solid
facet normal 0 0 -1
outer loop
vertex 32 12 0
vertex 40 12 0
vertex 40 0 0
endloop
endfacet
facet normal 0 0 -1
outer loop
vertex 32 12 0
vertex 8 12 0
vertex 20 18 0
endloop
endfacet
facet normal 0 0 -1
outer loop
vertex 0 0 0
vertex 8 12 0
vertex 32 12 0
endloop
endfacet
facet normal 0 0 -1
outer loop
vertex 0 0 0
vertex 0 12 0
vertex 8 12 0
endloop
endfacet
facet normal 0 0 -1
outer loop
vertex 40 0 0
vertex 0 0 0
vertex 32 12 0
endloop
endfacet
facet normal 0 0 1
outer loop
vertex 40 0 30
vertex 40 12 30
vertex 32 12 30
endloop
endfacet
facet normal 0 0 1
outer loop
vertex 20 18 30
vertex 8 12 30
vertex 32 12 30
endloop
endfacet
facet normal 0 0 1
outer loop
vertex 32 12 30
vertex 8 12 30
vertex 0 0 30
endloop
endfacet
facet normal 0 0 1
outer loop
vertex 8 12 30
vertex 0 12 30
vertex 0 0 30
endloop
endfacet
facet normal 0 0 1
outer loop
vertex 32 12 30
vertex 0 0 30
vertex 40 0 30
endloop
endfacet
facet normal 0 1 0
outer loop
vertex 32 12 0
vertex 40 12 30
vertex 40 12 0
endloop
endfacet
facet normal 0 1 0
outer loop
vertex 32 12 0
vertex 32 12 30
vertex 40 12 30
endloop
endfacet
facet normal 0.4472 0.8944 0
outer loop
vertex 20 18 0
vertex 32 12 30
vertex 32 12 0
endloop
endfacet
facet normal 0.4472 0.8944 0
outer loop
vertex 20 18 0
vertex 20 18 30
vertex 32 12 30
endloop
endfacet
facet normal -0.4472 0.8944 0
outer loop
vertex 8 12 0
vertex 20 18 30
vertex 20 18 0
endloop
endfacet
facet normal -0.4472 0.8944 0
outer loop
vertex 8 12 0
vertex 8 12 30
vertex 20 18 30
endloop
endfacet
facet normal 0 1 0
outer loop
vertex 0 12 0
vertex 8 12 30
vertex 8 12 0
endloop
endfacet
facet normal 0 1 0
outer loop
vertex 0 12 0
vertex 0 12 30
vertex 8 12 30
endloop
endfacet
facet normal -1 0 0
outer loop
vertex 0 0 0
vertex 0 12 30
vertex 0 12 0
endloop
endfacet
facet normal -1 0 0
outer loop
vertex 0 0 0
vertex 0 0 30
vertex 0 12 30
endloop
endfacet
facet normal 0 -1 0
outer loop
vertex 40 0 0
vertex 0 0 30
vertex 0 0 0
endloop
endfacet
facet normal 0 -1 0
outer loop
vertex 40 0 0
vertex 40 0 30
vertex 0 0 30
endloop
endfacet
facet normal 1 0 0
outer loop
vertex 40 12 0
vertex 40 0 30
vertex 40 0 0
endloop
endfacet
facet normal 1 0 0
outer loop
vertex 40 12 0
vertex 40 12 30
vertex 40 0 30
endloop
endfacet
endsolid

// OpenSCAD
$fn = 32;

// ----------------------------------------------------------------------
// V guide rail: vrib, 40 mm wide
// ----------------------------------------------------------------------

// --- parameters (mm) ---
rail_w = 40;              // rail width, X
base_t = 12;              // base plate thickness
v_depth = 6;              // V feature depth / height
v_half_w = 12;            // half width of the V at the base face
plate_t = 30;             // rail length, Z (the extrusion height)

profile = [[0, 0], [40, 0], [40, 12], [32, 12], [20, 18], [8, 12], [0, 12]];  // primary outline, 7 points, counter clockwise

// --- the one profile operation ---
linear_extrude(height = plate_t) polygon(points = profile);
